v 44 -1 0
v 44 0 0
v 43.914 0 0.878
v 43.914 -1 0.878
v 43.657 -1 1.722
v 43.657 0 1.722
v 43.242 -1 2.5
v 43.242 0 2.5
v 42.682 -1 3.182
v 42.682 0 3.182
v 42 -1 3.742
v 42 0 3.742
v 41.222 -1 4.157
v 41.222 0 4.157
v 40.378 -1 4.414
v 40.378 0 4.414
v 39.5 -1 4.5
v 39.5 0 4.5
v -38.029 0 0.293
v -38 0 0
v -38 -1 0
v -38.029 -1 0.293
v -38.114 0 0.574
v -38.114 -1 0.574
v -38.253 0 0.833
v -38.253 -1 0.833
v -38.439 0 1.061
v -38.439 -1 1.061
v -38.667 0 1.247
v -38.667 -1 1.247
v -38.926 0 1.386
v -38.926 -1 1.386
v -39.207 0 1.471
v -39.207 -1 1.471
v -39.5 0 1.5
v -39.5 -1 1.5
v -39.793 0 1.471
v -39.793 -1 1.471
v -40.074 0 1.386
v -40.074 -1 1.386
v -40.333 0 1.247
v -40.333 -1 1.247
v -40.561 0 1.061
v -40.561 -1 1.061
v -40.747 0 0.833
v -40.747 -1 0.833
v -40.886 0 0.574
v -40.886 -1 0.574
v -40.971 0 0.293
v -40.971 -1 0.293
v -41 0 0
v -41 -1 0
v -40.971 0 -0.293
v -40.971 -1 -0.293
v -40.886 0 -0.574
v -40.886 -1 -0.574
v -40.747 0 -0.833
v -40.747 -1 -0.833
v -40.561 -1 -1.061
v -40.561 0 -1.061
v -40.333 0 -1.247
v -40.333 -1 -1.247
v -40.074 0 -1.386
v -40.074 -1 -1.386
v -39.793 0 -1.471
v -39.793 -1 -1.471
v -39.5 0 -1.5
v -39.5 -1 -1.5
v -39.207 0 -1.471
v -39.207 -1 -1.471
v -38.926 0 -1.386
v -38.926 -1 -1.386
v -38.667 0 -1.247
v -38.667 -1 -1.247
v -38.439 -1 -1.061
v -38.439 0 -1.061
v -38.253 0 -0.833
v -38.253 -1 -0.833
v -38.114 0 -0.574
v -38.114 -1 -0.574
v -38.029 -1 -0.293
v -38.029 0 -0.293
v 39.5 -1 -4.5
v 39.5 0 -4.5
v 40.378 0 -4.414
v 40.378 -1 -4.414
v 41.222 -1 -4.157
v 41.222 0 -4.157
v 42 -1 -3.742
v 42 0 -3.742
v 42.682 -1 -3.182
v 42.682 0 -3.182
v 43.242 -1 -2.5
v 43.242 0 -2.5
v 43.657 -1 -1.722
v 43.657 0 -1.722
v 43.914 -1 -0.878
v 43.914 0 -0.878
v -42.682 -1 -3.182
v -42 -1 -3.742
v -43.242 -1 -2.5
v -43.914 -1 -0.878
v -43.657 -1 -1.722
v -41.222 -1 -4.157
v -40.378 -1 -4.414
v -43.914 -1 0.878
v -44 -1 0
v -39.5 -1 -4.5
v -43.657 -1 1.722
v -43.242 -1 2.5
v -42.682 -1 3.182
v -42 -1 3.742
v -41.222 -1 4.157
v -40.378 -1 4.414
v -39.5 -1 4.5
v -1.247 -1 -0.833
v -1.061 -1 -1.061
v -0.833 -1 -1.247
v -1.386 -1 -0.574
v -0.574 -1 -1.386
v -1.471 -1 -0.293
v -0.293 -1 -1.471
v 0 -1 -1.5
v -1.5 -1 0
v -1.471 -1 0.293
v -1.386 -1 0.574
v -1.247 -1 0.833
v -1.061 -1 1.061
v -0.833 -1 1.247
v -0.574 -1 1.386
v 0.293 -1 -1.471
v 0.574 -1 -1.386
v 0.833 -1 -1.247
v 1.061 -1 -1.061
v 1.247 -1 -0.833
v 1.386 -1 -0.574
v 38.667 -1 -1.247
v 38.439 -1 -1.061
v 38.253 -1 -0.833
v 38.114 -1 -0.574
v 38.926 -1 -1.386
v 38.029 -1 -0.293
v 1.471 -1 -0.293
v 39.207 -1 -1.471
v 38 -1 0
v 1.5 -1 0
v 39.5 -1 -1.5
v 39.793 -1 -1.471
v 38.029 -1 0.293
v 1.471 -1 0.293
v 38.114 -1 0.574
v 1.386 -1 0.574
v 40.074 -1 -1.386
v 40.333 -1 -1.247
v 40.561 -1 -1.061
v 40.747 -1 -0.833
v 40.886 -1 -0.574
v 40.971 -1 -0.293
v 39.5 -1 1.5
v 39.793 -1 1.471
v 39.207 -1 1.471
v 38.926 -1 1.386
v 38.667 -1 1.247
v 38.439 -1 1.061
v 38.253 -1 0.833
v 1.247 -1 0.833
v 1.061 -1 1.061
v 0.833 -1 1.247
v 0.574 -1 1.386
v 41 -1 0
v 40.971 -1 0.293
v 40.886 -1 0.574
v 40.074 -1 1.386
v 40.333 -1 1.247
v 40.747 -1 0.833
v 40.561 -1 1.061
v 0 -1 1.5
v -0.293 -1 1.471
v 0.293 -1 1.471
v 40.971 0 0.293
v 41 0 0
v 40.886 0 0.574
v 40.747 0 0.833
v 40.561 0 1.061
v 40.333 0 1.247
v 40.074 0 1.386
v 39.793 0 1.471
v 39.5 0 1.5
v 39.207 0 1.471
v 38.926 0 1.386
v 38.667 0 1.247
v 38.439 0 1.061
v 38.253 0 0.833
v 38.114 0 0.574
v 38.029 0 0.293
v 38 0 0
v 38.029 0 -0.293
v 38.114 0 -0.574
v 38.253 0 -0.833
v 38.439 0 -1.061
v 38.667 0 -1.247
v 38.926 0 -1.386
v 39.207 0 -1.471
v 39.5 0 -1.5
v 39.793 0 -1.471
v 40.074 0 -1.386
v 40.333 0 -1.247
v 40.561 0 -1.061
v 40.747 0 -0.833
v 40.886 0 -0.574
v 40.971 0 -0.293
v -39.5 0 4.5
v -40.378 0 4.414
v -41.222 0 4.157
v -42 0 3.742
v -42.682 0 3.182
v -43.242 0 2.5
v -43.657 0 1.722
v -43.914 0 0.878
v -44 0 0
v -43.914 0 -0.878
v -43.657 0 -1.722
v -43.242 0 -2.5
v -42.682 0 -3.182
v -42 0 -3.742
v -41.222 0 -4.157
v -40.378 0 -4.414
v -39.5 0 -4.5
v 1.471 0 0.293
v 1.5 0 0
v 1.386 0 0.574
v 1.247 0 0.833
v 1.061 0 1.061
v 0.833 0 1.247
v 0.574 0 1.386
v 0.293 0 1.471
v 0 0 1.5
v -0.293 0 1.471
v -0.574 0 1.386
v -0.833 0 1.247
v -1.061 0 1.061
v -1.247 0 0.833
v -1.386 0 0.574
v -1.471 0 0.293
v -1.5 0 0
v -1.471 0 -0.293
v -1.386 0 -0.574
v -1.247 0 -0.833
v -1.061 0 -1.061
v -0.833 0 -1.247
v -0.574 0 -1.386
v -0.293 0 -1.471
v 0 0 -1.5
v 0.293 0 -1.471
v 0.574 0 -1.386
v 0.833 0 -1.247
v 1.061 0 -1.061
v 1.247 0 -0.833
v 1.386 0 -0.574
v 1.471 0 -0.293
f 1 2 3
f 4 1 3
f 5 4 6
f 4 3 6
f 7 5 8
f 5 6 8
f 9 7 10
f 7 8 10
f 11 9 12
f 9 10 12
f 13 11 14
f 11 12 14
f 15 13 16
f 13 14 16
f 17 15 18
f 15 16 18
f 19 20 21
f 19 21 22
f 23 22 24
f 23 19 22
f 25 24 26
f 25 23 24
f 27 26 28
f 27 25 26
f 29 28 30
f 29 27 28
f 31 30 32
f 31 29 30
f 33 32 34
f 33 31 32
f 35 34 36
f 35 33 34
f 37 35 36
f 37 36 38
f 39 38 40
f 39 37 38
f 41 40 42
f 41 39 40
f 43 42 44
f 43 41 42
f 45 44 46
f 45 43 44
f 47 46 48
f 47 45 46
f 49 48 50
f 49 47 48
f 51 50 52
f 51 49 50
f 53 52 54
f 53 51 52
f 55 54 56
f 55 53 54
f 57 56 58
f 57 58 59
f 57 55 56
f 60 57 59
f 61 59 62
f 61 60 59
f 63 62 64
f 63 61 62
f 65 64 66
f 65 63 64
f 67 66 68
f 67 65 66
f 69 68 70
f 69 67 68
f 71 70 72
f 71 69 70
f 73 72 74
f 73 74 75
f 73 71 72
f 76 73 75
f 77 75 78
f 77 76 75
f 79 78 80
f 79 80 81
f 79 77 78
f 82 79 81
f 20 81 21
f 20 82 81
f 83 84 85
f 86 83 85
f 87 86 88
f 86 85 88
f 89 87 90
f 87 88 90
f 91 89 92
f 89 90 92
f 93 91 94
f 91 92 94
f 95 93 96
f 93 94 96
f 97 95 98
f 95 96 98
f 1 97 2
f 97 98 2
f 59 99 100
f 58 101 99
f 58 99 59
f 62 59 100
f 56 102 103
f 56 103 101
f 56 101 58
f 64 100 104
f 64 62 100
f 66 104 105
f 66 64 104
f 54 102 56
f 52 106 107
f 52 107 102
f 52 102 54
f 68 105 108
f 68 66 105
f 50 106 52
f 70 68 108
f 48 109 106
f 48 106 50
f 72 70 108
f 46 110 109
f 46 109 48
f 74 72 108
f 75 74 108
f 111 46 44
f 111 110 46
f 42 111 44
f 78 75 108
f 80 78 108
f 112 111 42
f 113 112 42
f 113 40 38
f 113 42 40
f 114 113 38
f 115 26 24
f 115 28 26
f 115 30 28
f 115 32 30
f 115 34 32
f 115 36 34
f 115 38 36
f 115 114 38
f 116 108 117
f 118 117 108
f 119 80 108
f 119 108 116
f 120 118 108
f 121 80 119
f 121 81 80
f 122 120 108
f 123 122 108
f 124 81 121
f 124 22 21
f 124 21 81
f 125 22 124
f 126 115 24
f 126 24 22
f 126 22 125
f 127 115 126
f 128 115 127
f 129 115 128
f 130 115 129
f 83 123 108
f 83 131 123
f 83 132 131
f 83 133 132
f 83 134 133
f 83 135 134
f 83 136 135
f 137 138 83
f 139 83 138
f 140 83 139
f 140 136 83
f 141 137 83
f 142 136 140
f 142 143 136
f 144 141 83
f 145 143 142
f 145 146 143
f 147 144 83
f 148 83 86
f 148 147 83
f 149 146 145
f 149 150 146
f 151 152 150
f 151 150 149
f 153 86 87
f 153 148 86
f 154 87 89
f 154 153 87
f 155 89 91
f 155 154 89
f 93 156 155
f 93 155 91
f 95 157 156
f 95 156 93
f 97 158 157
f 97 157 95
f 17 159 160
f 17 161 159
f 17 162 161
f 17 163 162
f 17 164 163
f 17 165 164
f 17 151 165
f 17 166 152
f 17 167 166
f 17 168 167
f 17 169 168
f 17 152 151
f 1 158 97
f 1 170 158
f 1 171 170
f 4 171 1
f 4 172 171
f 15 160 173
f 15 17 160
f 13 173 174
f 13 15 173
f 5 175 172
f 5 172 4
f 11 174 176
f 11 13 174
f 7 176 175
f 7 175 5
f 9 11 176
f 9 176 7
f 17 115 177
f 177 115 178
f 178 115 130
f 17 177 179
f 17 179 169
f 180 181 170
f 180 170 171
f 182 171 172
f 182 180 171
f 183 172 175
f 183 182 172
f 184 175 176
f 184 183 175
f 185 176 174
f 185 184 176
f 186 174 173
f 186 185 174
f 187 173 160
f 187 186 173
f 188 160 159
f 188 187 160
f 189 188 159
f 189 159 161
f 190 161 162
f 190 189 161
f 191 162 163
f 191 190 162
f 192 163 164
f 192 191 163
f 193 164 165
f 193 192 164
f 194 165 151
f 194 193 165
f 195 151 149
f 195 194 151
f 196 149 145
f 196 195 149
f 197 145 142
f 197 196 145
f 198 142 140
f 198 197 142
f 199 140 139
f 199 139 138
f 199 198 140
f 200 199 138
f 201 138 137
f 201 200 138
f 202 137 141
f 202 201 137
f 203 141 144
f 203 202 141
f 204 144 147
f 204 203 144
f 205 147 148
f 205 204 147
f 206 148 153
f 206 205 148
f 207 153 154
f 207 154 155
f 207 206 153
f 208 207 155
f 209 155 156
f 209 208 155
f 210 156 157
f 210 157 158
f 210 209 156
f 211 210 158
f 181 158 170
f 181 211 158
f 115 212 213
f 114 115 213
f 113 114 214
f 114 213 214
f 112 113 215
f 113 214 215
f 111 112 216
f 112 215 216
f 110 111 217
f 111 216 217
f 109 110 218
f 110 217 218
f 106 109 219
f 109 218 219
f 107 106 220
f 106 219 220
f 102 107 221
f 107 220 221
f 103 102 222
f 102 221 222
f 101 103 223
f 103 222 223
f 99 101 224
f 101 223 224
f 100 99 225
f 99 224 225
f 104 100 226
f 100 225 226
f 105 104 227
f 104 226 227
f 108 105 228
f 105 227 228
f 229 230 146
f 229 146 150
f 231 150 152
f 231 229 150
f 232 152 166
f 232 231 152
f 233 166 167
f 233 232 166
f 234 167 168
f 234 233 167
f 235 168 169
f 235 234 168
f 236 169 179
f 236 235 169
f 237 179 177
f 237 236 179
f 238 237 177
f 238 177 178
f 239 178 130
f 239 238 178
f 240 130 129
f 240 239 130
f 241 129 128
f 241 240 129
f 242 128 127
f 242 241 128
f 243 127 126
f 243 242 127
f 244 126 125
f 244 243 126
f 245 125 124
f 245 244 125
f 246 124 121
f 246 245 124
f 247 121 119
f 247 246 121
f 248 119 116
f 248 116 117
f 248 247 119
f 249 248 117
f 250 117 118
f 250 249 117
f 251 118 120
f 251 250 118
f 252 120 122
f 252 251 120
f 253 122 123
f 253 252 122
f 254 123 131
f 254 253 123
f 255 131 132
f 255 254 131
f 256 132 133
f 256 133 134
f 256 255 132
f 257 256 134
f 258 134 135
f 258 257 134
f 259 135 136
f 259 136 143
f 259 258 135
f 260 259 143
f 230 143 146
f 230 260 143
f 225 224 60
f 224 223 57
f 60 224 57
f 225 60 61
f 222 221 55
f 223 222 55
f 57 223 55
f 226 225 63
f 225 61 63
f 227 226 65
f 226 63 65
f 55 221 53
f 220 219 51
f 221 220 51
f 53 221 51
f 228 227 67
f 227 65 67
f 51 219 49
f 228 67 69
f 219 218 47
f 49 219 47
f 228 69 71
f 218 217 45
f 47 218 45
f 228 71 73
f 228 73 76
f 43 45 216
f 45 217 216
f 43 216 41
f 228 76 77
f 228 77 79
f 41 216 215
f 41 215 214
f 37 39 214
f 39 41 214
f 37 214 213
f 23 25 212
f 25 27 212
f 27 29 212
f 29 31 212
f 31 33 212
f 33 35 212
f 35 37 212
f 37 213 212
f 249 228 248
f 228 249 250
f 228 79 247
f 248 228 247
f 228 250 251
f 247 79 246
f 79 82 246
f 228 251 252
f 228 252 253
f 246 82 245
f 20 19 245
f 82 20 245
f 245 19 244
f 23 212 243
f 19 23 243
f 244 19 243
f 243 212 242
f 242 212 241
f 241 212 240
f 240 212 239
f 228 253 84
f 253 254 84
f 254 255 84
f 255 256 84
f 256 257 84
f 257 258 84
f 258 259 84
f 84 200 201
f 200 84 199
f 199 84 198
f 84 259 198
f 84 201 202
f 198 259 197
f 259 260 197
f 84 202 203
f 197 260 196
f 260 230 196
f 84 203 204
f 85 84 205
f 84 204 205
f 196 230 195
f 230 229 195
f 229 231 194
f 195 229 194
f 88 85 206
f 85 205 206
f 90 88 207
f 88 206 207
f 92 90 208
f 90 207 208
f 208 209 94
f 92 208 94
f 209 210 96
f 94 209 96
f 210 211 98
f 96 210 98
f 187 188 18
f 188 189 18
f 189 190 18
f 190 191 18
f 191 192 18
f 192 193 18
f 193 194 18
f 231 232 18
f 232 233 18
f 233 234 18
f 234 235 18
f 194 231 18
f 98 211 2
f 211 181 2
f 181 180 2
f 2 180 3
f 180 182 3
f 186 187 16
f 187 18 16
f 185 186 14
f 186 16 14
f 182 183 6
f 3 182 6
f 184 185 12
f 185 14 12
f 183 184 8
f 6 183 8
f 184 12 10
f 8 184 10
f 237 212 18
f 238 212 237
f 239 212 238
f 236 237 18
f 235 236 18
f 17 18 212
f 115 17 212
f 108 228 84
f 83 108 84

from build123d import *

# Parameters (mm, degrees)
F0_R     = 1.5
F1_DEPTH = 1


with BuildPart() as f1:
    # F0 (on Front) → F1 (new body)
    with BuildSketch(Plane.XZ):
        with BuildLine():
            ThreePointArc((39.5, -4.5), (35, 0), (39.5, 4.5))
            Line((39.5, 4.5), (-39.5, 4.5))
            ThreePointArc((-39.5, 4.5), (-36.318019, 3.181981), (-35, 0))
            ThreePointArc((-35, 0), (-36.318019, -3.181981), (-39.5, -4.5))
            Line((-39.5, -4.5), (39.5, -4.5))
        make_face()
        Circle(F0_R, mode=Mode.SUBTRACT)
        with BuildLine():
            ThreePointArc((44, 0), (42.681981, 3.181981), (39.5, 4.5))
            ThreePointArc((39.5, 4.5), (35, 0), (39.5, -4.5))
            ThreePointArc((39.5, -4.5), (42.681981, -3.181981), (44, 0))
        make_face()
        with Locations((39.5, 0)):
            Circle(F0_R, mode=Mode.SUBTRACT)
        with BuildLine():
            ThreePointArc((-35, 0), (-36.318019, 3.181981), (-39.5, 4.5))
            ThreePointArc((-39.5, 4.5), (-44, 0), (-39.5, -4.5))
            ThreePointArc((-39.5, -4.5), (-36.318019, -3.181981), (-35, 0))
        make_face()
        with Locations((-39.5, 0)):
            Circle(F0_R, mode=Mode.SUBTRACT)
    extrude(amount=F1_DEPTH)


solid = f1.part
